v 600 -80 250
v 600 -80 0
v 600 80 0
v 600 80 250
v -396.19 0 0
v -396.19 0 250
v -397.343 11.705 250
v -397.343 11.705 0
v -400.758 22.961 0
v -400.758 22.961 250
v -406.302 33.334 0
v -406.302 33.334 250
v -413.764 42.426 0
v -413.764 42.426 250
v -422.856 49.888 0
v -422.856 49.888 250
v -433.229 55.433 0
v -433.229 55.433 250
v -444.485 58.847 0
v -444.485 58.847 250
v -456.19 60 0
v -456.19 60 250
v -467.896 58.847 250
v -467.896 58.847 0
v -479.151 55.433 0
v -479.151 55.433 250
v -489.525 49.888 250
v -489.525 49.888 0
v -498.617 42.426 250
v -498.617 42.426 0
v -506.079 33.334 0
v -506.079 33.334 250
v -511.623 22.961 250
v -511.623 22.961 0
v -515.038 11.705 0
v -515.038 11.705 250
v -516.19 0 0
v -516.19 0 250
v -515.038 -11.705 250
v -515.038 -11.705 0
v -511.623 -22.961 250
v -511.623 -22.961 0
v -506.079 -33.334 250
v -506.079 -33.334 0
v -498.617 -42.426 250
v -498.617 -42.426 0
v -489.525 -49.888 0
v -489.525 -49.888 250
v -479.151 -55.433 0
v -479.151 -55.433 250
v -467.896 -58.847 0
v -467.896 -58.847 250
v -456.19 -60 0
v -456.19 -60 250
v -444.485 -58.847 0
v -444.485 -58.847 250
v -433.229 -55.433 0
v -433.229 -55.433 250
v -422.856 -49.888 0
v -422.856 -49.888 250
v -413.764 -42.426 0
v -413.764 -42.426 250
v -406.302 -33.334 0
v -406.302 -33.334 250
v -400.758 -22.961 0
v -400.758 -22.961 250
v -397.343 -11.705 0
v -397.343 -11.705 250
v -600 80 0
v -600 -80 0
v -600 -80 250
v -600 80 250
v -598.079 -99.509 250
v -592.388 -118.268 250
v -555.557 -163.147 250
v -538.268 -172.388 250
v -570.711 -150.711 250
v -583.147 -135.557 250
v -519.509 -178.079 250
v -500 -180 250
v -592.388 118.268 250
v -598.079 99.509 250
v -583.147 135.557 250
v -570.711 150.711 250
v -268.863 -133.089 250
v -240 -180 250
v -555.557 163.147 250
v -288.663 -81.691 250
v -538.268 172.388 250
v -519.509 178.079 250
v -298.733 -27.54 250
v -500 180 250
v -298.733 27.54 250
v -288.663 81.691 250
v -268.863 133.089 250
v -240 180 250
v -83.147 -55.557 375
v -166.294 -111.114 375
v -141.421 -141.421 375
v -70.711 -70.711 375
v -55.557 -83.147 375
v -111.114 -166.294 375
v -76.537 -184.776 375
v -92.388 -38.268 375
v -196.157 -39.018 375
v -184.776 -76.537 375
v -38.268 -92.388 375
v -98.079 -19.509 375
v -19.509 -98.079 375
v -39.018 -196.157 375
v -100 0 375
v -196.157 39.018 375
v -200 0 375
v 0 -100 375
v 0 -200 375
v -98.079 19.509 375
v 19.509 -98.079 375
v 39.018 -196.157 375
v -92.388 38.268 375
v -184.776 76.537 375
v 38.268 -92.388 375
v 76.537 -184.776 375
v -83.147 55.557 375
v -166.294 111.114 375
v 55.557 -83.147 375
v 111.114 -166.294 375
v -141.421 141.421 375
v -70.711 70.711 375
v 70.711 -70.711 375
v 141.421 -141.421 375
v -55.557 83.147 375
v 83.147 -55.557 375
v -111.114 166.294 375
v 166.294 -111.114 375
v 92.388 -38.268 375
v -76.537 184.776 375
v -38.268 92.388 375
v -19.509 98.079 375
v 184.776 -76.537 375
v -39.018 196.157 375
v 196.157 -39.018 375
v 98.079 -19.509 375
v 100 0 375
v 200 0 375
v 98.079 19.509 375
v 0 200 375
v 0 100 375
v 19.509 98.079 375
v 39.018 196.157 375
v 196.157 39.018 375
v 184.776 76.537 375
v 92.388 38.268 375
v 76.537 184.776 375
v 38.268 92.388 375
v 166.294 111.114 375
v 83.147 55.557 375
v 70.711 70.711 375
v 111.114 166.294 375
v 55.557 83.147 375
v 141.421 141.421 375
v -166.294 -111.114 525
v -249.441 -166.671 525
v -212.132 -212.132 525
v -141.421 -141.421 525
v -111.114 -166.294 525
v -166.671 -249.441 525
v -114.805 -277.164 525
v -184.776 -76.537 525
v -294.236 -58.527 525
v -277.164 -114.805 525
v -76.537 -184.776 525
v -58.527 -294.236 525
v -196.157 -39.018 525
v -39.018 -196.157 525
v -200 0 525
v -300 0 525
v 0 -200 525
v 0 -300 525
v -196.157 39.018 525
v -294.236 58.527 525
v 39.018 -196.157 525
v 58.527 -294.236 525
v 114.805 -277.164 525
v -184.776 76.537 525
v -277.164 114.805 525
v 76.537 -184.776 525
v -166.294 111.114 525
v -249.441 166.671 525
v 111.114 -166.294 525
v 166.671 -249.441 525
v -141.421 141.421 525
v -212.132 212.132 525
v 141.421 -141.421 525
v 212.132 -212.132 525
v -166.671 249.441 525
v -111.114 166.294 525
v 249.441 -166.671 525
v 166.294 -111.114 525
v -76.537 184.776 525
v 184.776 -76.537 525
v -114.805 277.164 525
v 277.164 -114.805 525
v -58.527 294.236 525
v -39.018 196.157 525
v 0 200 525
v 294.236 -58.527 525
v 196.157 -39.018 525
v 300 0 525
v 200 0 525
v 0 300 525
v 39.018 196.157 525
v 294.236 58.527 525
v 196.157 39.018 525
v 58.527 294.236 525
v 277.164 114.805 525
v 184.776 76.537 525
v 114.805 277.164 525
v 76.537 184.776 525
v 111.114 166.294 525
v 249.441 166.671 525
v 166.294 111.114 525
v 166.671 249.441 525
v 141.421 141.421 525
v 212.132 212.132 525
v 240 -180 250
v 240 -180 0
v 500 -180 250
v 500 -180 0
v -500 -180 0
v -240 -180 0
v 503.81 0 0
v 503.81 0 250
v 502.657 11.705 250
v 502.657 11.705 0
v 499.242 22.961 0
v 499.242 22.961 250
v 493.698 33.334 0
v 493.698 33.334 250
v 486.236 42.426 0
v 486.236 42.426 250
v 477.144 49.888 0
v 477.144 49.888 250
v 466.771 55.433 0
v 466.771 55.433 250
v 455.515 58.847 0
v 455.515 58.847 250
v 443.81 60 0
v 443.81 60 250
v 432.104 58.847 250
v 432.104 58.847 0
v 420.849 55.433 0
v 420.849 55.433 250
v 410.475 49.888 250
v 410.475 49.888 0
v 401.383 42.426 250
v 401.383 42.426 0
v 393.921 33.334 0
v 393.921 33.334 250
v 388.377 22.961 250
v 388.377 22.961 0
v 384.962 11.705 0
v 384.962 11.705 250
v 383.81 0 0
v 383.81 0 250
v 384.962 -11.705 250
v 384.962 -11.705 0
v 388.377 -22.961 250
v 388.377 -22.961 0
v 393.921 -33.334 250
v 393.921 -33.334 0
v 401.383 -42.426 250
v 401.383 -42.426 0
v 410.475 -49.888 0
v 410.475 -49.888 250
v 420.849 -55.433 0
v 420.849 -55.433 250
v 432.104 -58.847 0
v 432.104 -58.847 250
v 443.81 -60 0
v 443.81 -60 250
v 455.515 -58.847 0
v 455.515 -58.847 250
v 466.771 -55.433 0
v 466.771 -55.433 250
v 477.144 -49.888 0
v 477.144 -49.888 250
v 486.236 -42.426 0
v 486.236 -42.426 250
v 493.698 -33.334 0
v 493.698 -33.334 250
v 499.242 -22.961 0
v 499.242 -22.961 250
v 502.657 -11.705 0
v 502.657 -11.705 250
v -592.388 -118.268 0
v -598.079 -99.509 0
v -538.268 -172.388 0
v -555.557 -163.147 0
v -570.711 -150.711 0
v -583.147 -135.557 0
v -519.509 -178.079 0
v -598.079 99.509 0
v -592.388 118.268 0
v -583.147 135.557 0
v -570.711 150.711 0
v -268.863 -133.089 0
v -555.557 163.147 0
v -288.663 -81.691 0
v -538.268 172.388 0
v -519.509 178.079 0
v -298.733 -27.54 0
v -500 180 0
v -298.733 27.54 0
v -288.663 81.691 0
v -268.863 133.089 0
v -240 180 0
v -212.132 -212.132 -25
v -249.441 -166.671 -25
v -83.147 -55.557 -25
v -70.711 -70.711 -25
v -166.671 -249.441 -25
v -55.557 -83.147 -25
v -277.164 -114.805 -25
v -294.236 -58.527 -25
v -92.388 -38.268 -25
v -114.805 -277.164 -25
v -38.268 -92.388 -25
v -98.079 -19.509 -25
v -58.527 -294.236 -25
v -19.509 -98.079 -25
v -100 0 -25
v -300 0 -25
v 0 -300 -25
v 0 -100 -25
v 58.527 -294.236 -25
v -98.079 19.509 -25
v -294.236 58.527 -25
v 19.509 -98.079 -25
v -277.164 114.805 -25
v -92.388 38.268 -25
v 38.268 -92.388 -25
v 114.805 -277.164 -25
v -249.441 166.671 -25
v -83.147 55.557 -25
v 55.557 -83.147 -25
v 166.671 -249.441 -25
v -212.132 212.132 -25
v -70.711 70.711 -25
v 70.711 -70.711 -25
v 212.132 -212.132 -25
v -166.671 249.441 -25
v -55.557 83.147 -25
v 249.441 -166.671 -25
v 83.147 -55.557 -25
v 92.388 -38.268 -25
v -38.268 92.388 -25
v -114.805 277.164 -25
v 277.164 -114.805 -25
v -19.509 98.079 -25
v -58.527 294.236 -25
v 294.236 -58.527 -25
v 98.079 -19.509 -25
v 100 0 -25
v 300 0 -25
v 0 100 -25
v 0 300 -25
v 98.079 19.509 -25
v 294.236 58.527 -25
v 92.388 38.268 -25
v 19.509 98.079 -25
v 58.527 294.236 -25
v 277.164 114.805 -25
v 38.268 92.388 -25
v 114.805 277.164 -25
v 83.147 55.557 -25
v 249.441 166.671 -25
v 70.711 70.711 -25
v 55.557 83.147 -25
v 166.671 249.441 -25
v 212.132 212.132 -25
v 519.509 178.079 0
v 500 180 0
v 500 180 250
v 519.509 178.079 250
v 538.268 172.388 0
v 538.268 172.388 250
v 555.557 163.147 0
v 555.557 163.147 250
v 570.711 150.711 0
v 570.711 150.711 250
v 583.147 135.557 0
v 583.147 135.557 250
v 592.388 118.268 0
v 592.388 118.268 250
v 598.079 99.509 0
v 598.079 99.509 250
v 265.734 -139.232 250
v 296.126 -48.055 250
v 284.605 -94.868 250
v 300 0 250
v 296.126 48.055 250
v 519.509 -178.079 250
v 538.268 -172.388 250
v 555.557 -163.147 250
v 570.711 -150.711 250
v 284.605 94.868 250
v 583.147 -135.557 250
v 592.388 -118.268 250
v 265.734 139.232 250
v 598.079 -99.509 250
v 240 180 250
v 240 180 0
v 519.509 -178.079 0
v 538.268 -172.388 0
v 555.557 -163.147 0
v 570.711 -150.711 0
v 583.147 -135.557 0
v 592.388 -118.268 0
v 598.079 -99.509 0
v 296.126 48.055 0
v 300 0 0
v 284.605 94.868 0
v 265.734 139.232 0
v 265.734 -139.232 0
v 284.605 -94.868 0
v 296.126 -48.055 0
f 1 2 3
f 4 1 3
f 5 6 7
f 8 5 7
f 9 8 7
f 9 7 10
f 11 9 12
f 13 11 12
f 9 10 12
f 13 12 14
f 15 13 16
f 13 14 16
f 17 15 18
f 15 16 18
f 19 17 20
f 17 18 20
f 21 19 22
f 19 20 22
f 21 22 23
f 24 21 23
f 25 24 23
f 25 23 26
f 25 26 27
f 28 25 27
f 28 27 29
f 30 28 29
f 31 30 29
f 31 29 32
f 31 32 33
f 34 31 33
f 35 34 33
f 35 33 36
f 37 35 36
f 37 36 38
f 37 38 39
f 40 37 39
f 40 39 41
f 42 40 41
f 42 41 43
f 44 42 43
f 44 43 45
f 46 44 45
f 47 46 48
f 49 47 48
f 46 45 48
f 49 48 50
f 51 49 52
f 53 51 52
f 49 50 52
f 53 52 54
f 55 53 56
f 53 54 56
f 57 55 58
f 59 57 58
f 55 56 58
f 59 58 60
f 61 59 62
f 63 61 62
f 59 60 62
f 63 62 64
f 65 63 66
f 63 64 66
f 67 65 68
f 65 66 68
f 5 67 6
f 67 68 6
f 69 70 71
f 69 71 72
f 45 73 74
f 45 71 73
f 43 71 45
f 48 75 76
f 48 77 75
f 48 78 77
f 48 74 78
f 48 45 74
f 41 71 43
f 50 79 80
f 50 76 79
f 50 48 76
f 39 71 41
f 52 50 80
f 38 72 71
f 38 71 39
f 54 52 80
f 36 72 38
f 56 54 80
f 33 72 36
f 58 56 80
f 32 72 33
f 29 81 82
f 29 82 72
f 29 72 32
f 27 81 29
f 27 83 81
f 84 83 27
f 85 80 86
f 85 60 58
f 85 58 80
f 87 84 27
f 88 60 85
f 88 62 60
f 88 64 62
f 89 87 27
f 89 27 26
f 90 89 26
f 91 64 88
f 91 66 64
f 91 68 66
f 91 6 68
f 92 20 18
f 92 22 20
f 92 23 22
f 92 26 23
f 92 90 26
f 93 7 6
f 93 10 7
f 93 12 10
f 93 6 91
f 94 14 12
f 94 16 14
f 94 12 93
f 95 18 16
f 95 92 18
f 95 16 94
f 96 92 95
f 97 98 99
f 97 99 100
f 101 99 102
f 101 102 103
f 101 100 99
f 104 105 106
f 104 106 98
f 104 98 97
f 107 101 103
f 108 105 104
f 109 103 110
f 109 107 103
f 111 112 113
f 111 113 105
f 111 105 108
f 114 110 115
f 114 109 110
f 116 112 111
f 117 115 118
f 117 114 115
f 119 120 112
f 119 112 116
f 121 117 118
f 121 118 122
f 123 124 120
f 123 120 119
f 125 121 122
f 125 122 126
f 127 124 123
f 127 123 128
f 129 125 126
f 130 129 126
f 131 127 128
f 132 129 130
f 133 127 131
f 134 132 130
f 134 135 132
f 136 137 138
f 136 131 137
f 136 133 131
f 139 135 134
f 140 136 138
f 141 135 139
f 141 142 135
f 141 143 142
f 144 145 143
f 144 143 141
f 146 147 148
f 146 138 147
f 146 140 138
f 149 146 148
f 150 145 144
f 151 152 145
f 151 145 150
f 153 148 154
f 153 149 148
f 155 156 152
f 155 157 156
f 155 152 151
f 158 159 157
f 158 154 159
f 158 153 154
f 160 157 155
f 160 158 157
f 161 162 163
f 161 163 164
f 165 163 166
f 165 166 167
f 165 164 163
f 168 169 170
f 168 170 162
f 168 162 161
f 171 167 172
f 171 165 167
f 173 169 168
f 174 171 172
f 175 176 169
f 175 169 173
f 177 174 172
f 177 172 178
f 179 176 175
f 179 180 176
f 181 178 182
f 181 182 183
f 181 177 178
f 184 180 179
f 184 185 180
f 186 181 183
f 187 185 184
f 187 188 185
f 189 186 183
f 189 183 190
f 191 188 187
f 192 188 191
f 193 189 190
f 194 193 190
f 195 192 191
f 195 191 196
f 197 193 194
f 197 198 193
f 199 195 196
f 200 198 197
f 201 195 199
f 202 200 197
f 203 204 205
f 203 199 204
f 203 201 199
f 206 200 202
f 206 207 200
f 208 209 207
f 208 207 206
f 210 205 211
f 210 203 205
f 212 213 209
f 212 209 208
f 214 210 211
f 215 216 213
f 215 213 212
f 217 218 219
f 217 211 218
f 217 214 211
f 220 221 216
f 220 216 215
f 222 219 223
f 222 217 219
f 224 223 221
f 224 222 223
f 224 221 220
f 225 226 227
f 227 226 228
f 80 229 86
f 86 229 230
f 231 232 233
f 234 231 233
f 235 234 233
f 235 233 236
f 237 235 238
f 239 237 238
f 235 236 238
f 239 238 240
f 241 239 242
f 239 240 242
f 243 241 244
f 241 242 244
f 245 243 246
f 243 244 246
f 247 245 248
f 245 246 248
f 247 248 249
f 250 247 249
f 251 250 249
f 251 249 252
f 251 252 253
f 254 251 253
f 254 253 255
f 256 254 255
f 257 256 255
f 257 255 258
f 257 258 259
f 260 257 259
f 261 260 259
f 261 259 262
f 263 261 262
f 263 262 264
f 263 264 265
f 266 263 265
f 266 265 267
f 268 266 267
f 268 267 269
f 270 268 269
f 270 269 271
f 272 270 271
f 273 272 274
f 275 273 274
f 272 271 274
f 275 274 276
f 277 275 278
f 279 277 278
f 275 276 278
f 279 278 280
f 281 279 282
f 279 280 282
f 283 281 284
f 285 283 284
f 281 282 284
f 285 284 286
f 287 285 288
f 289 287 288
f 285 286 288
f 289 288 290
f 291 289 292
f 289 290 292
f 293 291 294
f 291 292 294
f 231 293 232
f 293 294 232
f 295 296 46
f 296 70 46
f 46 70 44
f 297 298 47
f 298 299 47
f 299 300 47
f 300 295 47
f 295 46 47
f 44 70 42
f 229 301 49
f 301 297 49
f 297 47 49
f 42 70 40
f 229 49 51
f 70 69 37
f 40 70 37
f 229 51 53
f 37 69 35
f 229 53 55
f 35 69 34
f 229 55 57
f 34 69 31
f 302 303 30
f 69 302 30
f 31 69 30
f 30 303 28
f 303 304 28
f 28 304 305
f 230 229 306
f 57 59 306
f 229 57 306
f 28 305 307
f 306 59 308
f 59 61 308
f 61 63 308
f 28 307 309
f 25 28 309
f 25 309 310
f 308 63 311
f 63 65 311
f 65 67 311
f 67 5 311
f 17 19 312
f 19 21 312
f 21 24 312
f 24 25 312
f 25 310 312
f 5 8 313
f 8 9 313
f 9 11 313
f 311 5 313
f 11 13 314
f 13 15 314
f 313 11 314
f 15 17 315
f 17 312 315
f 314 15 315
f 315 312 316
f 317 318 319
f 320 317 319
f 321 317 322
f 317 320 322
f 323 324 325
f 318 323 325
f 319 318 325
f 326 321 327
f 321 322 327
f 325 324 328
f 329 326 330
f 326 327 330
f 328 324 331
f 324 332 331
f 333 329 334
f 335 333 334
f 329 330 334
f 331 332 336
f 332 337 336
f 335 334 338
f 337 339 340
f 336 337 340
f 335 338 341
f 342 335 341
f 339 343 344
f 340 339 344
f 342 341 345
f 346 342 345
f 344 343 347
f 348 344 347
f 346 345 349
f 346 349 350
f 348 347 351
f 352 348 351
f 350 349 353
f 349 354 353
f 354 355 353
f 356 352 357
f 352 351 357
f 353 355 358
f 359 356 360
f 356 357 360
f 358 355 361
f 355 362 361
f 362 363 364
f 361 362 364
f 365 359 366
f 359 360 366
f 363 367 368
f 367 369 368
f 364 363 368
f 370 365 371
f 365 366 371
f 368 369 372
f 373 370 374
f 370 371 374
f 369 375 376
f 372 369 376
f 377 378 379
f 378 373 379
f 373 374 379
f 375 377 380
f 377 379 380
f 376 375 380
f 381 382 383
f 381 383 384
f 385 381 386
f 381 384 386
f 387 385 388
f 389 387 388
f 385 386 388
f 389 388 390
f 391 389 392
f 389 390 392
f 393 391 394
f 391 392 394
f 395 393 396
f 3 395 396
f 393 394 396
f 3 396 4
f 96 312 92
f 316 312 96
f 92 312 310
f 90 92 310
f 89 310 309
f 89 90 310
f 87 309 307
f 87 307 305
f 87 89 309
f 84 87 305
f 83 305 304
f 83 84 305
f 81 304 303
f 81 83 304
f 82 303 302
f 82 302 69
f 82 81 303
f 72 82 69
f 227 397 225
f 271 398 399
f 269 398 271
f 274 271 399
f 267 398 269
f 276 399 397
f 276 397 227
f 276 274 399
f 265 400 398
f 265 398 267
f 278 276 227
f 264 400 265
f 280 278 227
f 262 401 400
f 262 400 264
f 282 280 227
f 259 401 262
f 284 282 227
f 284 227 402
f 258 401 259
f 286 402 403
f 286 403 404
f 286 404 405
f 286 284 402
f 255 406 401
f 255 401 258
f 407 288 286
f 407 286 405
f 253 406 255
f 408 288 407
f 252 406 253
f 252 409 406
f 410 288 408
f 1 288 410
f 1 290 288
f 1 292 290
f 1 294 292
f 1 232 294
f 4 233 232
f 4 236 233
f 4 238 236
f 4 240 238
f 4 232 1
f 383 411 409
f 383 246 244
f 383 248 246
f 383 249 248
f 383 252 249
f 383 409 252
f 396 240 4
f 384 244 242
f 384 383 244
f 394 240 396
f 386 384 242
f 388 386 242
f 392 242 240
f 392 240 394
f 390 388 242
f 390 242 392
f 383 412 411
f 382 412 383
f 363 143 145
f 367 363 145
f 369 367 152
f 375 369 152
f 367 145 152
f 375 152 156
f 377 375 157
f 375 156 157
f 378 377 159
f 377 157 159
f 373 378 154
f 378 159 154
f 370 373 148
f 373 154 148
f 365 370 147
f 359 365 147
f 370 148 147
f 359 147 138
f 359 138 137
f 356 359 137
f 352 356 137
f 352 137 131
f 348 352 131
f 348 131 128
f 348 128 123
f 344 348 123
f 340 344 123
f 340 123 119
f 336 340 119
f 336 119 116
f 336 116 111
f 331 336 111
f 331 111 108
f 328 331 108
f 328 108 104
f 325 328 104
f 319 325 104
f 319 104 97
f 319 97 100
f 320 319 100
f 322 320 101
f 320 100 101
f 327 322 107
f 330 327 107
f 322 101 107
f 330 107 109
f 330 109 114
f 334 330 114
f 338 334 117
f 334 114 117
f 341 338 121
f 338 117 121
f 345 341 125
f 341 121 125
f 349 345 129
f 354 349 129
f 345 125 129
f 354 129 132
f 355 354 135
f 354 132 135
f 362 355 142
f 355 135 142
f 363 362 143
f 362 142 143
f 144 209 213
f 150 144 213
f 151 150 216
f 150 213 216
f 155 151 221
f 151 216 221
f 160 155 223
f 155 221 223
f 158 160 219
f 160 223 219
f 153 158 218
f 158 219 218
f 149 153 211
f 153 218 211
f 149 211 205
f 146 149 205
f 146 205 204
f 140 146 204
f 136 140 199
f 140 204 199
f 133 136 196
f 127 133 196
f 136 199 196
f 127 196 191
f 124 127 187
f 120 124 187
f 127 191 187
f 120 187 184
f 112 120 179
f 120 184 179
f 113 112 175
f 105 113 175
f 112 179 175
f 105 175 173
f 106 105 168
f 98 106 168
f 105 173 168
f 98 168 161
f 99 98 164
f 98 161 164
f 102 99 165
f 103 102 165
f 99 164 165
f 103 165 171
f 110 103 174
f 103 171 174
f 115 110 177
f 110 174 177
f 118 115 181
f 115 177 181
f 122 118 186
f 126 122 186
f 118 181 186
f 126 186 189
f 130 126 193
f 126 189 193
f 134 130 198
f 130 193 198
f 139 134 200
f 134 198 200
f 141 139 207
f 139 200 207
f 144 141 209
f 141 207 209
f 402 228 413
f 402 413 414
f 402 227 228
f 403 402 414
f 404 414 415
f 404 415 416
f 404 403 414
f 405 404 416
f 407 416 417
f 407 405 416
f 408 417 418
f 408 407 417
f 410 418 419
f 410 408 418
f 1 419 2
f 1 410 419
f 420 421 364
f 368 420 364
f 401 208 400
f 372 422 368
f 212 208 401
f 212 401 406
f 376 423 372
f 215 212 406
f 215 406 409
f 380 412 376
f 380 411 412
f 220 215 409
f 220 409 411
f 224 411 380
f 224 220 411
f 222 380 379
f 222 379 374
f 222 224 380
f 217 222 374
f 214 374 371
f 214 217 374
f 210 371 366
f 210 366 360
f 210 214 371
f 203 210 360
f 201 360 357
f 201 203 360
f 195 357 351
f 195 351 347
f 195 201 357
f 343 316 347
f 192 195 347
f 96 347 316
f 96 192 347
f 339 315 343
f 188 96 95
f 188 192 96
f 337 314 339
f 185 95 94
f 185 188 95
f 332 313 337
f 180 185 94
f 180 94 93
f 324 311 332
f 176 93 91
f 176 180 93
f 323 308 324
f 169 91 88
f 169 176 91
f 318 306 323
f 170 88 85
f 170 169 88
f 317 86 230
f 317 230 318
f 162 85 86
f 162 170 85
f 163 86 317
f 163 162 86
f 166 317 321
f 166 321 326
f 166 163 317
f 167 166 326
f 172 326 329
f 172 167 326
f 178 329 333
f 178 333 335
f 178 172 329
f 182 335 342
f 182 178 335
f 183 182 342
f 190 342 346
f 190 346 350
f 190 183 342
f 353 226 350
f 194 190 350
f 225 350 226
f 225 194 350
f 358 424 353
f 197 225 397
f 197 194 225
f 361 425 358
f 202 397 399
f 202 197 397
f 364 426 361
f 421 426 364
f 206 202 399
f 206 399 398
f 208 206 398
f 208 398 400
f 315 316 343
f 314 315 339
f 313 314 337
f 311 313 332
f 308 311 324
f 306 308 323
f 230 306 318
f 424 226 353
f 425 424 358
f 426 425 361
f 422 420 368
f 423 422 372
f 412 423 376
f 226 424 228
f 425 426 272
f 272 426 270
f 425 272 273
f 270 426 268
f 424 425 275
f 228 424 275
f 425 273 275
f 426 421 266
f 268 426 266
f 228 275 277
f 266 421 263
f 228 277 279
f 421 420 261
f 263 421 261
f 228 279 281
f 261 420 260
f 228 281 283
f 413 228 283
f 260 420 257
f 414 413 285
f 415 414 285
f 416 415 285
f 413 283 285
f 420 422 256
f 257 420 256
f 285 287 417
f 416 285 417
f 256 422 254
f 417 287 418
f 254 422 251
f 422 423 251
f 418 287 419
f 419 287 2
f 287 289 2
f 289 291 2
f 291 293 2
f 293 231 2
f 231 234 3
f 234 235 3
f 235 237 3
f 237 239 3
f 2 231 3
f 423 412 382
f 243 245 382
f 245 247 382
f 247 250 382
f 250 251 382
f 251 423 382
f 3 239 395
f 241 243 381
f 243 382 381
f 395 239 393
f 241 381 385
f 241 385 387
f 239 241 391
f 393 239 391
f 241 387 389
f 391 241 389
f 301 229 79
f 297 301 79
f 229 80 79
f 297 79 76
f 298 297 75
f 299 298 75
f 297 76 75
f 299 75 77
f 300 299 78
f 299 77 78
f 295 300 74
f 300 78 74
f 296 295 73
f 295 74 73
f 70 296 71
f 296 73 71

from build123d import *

# Parameters (mm, degrees)
F0_W     = 1200
F0_H     = 360
F1_DEPTH = 250
F2_R     = 60
F3_DEPTH = 250.001
F4_R     = 300
F5_DEPTH = 275
F6_R     = 200
F7_DEPTH = 150
F8_R     = 100
F9_DEPTH = 400.001
F10_R    = 100


with BuildPart() as f1:
    # F0 (on Top) → F1 (new body)
    with BuildSketch(Plane.XY):
        Rectangle(F0_W, F0_H)
    extrude(amount=F1_DEPTH)

    # F2 (on face) → F3 (cut, through all)
    with BuildSketch(Plane.XY.offset(250)):
        with Locations((-456.190459, 0)):
            Circle(F2_R)
        with Locations((443.809541, 0)):
            Circle(F2_R)
    extrude(amount=-F3_DEPTH, mode=Mode.SUBTRACT)

    # F4 (on face) → F5 (join, symmetric)
    with BuildSketch(Plane.XY.offset(250)):
        Circle(F4_R)
        with BuildLine():
            ThreePointArc((240, -180), (284.604989, -94.86833), (300, 0))
            ThreePointArc((300, 0), (284.604989, 94.86833), (240, 180))
            Line((240, 180), (-240, 180))
            ThreePointArc((-240, 180), (-300, 0), (-240, -180))
            Line((-240, -180), (240, -180))
        make_face()
    extrude(amount=F5_DEPTH, both=True)

    # F6 (on face) → F7 (cut)
    with BuildSketch(Plane.XY.offset(525)):
        Circle(F6_R)
    extrude(amount=-F7_DEPTH, mode=Mode.SUBTRACT)

    # F8 (on face) → F9 (cut, through all)
    with BuildSketch(Plane.XY.offset(375)):
        Circle(F8_R)
    extrude(amount=-F9_DEPTH, mode=Mode.SUBTRACT)

    # F10
    f10_edges = [f1.edges().sort_by_distance(p)[0] for p in [
        (600, -180, 125),
        (600, 180, 125),
        (-600, -180, 125),
        (-600, 180, 125),
    ]]
    fillet(f10_edges, radius=F10_R)


solid = f1.part
